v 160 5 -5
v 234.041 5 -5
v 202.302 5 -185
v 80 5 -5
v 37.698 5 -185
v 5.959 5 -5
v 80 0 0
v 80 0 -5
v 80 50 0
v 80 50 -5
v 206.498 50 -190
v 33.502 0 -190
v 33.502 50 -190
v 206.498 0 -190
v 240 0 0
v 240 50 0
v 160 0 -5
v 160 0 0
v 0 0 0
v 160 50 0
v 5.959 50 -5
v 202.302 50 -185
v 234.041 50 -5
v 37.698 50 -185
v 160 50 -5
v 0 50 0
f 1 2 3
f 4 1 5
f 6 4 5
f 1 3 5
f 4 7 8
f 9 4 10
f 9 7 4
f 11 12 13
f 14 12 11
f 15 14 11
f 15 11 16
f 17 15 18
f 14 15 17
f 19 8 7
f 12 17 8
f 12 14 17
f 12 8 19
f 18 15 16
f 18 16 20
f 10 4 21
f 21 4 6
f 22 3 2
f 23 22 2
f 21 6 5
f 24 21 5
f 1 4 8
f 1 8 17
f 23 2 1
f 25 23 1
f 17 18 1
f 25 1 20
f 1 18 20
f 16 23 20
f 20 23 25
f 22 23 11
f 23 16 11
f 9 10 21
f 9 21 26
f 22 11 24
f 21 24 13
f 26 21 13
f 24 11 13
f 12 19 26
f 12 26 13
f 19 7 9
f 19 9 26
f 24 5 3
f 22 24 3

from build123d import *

# Parameters (mm, degrees)
BOSS_EXTRUDE1_DEPTH = 50
SHELL2_T            = -5
SKETCH3_W           = 80
SKETCH3_H           = 50
CUT_EXTRUDE1_DEPTH  = 5


with BuildPart() as part:
    # Sketch1 → Boss-Extrude1 (new body)
    with BuildSketch(Plane(origin=(0, 0, 0), x_dir=(1, 0, 0), z_dir=(0, 1, 0))):
        Polygon((0, 0), (33.502126335, 190), (206.497873665, 190), (240, 0), align=None)
    extrude(amount=BOSS_EXTRUDE1_DEPTH)

    # Shell2
    shell2_openings = [part.faces().sort_by_distance(p)[0] for p in [
        (120, 50, -95),
    ]]
    offset(amount=SHELL2_T, openings=shell2_openings, kind=Kind.INTERSECTION)

    # Sketch3 → Cut-Extrude1 (cut)
    with BuildSketch(Plane.XY):
        with Locations((120, 25)):
            Rectangle(SKETCH3_W, SKETCH3_H)
    extrude(amount=-CUT_EXTRUDE1_DEPTH, mode=Mode.SUBTRACT)


solid = part.part
